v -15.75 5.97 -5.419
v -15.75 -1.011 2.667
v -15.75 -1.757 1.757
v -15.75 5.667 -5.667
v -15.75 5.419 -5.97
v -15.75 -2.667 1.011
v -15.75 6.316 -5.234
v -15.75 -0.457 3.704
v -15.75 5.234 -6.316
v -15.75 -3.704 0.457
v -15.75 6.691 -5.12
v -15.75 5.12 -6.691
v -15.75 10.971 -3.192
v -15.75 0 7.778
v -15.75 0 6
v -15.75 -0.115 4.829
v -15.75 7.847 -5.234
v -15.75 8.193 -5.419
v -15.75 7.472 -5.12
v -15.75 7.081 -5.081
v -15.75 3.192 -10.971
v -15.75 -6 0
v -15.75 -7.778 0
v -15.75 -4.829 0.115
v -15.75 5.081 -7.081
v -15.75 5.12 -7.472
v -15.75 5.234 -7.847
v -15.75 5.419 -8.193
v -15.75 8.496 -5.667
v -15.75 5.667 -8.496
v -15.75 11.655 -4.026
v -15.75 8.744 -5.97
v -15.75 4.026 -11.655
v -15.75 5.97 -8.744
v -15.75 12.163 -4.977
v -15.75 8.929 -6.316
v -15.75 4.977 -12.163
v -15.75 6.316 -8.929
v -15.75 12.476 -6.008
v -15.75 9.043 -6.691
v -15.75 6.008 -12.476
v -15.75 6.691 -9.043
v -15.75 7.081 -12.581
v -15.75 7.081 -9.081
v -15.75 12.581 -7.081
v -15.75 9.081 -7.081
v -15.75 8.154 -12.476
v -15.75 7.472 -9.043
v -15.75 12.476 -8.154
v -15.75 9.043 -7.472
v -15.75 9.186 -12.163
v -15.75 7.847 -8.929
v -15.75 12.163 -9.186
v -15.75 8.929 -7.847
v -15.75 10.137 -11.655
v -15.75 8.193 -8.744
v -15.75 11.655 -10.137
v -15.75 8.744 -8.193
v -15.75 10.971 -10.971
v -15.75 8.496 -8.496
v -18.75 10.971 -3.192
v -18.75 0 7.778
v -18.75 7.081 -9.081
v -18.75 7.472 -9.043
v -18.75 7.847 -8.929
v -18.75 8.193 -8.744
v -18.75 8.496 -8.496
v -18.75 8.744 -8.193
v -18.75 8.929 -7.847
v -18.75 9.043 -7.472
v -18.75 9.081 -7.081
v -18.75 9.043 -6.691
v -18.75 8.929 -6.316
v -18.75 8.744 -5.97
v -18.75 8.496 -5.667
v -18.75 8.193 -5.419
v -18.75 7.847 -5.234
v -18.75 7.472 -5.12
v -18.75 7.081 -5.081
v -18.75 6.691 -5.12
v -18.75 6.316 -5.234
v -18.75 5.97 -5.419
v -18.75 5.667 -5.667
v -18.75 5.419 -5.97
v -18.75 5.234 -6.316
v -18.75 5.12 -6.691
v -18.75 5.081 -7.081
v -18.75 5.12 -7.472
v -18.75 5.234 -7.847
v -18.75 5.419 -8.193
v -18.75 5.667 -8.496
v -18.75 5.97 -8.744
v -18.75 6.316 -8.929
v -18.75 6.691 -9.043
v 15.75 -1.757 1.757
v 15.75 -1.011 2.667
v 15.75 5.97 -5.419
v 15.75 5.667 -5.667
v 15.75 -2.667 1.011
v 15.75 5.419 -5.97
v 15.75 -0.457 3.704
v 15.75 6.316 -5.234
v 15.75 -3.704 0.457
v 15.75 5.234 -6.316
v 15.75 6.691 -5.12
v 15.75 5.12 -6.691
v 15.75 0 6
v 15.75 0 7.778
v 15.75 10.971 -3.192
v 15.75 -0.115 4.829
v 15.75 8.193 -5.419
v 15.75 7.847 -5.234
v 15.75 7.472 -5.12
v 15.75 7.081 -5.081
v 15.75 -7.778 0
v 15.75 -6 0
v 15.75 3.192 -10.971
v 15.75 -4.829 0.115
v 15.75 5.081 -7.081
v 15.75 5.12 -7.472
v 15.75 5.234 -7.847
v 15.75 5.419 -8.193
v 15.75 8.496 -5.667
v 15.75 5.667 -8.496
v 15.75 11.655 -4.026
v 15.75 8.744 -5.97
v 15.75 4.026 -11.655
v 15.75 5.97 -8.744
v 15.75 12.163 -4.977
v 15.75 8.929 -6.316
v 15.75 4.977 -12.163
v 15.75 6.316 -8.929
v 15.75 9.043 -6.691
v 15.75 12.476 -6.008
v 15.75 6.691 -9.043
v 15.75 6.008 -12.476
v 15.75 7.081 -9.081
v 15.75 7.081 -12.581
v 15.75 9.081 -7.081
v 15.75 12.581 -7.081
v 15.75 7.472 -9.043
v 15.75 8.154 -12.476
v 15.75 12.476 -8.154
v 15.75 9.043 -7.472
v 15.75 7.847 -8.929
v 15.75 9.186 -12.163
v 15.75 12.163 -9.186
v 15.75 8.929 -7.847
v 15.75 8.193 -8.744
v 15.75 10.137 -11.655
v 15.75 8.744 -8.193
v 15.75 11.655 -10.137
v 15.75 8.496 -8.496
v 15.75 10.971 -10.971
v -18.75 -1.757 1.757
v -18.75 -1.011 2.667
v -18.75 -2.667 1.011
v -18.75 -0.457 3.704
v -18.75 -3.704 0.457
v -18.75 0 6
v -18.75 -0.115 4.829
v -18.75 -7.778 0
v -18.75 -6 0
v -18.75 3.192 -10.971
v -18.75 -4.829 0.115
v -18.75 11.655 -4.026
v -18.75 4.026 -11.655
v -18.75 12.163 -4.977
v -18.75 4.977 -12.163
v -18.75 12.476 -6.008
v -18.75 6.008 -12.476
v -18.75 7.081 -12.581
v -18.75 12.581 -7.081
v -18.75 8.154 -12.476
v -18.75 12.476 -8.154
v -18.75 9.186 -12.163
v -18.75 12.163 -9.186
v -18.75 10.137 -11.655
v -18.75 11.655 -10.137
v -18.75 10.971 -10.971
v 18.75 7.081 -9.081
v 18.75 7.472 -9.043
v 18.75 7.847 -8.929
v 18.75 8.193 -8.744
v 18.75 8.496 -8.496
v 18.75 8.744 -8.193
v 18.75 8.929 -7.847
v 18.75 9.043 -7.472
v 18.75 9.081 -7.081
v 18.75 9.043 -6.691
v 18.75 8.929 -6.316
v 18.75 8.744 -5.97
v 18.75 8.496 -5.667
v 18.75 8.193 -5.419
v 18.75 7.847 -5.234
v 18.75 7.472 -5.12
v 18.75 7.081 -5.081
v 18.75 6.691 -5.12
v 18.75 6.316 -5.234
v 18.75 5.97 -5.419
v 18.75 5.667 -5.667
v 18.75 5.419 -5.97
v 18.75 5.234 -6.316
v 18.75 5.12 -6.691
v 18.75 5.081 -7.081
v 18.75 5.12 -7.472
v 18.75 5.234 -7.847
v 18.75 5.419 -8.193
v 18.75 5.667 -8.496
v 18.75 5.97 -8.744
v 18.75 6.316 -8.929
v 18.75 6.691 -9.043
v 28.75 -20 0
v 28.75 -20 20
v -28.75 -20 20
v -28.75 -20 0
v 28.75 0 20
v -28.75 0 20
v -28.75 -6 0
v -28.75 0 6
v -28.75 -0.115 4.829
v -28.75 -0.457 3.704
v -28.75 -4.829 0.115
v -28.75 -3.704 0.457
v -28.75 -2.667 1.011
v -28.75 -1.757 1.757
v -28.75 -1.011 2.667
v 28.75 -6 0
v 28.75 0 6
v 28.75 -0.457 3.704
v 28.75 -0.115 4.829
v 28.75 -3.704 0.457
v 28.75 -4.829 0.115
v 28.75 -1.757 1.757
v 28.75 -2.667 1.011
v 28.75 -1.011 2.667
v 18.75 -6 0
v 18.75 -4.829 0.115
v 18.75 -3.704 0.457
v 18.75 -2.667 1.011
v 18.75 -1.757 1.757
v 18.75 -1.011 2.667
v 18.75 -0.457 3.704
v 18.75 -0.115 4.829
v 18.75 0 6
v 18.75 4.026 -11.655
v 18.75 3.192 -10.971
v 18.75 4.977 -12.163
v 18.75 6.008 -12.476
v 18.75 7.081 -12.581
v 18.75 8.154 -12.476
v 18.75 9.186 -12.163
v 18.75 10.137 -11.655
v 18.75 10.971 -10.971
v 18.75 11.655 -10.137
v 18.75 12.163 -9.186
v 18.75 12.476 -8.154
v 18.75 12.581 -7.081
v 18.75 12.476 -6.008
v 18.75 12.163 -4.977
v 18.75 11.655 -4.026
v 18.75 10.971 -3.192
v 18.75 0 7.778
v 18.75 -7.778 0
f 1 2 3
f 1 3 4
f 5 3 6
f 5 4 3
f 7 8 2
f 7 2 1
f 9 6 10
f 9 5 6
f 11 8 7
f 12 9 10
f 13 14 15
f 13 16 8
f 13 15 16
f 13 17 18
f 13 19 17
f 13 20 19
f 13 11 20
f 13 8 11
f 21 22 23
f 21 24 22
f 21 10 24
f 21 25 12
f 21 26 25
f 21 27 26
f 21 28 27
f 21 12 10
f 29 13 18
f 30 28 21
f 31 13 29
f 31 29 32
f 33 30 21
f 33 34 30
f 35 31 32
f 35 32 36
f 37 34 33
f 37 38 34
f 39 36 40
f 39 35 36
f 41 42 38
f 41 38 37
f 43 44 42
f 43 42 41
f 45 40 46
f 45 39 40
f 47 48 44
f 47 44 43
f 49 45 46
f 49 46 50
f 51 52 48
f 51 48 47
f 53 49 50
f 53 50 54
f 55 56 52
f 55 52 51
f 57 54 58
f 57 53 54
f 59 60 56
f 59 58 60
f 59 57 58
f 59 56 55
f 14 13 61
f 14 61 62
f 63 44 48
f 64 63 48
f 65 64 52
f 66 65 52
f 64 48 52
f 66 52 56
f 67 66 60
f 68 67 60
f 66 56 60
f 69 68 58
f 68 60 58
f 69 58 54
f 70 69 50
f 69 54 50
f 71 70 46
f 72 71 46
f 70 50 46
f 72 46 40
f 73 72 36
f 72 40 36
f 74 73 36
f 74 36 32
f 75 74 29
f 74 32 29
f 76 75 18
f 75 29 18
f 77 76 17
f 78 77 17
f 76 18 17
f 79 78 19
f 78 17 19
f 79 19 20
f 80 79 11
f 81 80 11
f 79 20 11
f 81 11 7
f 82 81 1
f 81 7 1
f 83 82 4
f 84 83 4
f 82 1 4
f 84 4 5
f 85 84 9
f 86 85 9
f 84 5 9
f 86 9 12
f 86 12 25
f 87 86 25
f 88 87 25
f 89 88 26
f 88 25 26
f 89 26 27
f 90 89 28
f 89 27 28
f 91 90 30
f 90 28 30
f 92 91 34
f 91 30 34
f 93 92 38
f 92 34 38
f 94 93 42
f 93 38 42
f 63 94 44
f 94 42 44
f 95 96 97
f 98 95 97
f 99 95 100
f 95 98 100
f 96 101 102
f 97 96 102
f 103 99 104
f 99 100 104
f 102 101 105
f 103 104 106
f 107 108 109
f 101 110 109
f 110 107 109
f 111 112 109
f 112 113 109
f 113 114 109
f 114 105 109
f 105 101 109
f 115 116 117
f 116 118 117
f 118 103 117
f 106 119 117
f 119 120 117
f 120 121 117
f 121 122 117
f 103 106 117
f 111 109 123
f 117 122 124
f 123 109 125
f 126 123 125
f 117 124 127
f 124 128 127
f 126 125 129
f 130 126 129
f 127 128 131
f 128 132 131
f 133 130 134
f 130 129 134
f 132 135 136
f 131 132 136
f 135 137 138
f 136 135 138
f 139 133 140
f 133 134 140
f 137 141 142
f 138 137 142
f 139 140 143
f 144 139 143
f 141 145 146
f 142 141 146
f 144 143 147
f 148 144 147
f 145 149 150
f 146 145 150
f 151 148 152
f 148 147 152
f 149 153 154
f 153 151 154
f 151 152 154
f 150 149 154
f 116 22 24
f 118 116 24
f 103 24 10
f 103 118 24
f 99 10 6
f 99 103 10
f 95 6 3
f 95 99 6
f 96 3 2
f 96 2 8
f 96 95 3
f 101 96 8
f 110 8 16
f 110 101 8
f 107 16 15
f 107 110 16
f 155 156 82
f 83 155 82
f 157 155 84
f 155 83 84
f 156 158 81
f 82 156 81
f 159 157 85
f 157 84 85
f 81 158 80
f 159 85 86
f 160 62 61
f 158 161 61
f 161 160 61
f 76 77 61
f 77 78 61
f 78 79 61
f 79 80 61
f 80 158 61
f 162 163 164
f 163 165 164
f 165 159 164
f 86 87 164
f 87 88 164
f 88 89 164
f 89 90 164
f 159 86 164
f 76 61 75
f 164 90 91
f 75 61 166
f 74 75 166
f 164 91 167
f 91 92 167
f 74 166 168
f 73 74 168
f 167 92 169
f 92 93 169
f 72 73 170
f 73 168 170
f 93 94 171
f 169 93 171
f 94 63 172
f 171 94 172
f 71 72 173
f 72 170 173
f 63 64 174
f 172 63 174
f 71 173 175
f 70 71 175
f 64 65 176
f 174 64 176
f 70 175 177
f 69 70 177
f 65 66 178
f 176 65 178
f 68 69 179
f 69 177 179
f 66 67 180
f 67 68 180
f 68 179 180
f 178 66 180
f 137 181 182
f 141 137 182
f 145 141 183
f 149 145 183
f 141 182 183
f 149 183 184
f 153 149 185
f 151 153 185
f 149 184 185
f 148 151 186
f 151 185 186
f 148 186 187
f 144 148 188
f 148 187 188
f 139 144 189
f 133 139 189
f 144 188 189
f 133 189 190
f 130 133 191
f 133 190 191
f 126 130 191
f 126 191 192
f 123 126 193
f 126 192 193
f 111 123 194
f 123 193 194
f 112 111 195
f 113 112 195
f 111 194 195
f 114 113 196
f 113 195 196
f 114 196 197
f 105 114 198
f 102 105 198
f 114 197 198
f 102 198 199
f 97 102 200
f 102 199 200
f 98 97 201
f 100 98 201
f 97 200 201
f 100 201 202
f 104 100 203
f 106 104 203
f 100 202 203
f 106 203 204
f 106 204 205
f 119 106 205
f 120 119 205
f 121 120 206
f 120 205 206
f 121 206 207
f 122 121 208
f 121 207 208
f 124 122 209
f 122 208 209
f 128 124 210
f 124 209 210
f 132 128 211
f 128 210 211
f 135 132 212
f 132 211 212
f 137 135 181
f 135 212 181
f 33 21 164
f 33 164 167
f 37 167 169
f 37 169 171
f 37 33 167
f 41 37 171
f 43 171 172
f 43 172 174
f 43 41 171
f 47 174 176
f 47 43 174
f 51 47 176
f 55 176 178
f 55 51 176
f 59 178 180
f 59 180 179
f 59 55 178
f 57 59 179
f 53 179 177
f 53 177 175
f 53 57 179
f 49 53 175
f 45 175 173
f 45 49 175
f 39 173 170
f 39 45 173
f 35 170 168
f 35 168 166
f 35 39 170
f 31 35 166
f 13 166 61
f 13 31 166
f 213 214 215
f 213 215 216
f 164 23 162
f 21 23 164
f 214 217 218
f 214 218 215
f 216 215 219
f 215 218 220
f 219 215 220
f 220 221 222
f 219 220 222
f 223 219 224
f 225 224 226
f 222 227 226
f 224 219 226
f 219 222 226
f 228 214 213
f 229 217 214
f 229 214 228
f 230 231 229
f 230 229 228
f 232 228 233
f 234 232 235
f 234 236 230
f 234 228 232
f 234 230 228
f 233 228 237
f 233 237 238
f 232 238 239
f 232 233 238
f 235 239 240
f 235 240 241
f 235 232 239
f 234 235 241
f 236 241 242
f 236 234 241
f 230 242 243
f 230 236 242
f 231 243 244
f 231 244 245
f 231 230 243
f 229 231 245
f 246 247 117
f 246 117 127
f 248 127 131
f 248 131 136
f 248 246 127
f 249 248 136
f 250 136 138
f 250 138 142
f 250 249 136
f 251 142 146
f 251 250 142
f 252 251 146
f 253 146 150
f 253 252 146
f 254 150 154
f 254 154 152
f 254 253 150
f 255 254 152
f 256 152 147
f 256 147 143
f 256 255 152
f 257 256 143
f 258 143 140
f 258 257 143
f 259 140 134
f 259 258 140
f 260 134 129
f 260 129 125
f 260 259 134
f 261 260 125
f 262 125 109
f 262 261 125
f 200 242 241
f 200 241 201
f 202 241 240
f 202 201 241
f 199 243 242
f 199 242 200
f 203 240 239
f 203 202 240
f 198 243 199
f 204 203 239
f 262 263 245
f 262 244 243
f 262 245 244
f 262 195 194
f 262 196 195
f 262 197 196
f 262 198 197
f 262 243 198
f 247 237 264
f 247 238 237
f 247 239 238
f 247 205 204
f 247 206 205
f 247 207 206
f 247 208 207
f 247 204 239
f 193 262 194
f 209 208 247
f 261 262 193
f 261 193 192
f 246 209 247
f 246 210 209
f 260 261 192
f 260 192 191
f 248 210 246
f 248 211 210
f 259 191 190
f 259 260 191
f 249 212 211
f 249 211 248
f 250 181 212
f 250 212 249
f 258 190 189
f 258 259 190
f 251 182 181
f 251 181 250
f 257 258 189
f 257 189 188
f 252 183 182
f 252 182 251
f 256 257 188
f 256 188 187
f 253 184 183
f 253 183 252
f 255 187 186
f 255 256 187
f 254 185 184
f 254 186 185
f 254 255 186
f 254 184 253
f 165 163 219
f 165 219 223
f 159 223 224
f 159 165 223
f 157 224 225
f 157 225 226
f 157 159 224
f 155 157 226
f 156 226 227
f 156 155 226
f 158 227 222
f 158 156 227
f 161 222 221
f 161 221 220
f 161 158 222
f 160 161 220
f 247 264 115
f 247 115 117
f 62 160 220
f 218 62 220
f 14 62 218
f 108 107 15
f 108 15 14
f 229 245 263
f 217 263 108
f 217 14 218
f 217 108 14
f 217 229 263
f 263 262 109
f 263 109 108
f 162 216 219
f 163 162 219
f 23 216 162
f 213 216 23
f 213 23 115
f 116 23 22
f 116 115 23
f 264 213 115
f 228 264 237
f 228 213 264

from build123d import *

# Parameters (mm, degrees)
EXTRUDE1_DEPTH = 28.75
EXTRUDE2_START = 18.75
SKETCH2_R      = 2
EXTRUDE2_DEPTH = 3
EXTRUDE3_START = -15.75
SKETCH_R       = 2
EXTRUDE3_DEPTH = 3


with BuildPart() as part:
    # Sketch1 → Extrude1 (new, symmetric)
    with BuildSketch(Plane(origin=(0, 0, 0), x_dir=(0, 0, -1), z_dir=(1, 0, 0))):
        with BuildLine():
            Line((-6, 0), (-20, 0))
            Line((-20, 0), (-20, -20))
            Line((-20, -20), (0, -20))
            Line((0, -20), (0, -6))
            ThreePointArc((0, -6), (-1.757359313, -1.757359313), (-6, 0))
        make_face()
    extrude(amount=EXTRUDE1_DEPTH, both=True)

    # Sketch2 → Extrude2 (add)
    with BuildSketch(Plane(origin=(0, 0, 0), x_dir=(0, 0, -1), z_dir=(1, 0, 0)).offset(EXTRUDE2_START)):
        with BuildLine():
            Line((-6.707106781, -14.485281374), (10.970562748, 3.192388155))
            ThreePointArc((10.970562748, 3.192388155), (10.970562748, 10.970562748), (3.192388155, 10.970562748))
            Line((3.192388155, 10.970562748), (-14.485281374, -6.707106781))
            Line((-14.485281374, -6.707106781), (-6.707106781, -14.485281374))
        make_face()
        with Locations((7.081475452, 7.081475452)):
            Circle(SKETCH2_R, mode=Mode.SUBTRACT)
    extrude(amount=-EXTRUDE2_DEPTH)

    # Sketch → Extrude3 (add)
    with BuildSketch(Plane(origin=(0, 0, 0), x_dir=(0, 0, -1), z_dir=(1, 0, 0)).offset(EXTRUDE3_START)):
        with BuildLine():
            Line((-6.707106781, -14.485281374), (10.970562748, 3.192388155))
            ThreePointArc((10.970562748, 3.192388155), (10.970562748, 10.970562748), (3.192388155, 10.970562748))
            Line((3.192388155, 10.970562748), (-14.485281374, -6.707106781))
            Line((-14.485281374, -6.707106781), (-6.707106781, -14.485281374))
        make_face()
        with Locations((7.081475452, 7.081475452)):
            Circle(SKETCH_R, mode=Mode.SUBTRACT)
    extrude(amount=-EXTRUDE3_DEPTH)


solid = part.part
